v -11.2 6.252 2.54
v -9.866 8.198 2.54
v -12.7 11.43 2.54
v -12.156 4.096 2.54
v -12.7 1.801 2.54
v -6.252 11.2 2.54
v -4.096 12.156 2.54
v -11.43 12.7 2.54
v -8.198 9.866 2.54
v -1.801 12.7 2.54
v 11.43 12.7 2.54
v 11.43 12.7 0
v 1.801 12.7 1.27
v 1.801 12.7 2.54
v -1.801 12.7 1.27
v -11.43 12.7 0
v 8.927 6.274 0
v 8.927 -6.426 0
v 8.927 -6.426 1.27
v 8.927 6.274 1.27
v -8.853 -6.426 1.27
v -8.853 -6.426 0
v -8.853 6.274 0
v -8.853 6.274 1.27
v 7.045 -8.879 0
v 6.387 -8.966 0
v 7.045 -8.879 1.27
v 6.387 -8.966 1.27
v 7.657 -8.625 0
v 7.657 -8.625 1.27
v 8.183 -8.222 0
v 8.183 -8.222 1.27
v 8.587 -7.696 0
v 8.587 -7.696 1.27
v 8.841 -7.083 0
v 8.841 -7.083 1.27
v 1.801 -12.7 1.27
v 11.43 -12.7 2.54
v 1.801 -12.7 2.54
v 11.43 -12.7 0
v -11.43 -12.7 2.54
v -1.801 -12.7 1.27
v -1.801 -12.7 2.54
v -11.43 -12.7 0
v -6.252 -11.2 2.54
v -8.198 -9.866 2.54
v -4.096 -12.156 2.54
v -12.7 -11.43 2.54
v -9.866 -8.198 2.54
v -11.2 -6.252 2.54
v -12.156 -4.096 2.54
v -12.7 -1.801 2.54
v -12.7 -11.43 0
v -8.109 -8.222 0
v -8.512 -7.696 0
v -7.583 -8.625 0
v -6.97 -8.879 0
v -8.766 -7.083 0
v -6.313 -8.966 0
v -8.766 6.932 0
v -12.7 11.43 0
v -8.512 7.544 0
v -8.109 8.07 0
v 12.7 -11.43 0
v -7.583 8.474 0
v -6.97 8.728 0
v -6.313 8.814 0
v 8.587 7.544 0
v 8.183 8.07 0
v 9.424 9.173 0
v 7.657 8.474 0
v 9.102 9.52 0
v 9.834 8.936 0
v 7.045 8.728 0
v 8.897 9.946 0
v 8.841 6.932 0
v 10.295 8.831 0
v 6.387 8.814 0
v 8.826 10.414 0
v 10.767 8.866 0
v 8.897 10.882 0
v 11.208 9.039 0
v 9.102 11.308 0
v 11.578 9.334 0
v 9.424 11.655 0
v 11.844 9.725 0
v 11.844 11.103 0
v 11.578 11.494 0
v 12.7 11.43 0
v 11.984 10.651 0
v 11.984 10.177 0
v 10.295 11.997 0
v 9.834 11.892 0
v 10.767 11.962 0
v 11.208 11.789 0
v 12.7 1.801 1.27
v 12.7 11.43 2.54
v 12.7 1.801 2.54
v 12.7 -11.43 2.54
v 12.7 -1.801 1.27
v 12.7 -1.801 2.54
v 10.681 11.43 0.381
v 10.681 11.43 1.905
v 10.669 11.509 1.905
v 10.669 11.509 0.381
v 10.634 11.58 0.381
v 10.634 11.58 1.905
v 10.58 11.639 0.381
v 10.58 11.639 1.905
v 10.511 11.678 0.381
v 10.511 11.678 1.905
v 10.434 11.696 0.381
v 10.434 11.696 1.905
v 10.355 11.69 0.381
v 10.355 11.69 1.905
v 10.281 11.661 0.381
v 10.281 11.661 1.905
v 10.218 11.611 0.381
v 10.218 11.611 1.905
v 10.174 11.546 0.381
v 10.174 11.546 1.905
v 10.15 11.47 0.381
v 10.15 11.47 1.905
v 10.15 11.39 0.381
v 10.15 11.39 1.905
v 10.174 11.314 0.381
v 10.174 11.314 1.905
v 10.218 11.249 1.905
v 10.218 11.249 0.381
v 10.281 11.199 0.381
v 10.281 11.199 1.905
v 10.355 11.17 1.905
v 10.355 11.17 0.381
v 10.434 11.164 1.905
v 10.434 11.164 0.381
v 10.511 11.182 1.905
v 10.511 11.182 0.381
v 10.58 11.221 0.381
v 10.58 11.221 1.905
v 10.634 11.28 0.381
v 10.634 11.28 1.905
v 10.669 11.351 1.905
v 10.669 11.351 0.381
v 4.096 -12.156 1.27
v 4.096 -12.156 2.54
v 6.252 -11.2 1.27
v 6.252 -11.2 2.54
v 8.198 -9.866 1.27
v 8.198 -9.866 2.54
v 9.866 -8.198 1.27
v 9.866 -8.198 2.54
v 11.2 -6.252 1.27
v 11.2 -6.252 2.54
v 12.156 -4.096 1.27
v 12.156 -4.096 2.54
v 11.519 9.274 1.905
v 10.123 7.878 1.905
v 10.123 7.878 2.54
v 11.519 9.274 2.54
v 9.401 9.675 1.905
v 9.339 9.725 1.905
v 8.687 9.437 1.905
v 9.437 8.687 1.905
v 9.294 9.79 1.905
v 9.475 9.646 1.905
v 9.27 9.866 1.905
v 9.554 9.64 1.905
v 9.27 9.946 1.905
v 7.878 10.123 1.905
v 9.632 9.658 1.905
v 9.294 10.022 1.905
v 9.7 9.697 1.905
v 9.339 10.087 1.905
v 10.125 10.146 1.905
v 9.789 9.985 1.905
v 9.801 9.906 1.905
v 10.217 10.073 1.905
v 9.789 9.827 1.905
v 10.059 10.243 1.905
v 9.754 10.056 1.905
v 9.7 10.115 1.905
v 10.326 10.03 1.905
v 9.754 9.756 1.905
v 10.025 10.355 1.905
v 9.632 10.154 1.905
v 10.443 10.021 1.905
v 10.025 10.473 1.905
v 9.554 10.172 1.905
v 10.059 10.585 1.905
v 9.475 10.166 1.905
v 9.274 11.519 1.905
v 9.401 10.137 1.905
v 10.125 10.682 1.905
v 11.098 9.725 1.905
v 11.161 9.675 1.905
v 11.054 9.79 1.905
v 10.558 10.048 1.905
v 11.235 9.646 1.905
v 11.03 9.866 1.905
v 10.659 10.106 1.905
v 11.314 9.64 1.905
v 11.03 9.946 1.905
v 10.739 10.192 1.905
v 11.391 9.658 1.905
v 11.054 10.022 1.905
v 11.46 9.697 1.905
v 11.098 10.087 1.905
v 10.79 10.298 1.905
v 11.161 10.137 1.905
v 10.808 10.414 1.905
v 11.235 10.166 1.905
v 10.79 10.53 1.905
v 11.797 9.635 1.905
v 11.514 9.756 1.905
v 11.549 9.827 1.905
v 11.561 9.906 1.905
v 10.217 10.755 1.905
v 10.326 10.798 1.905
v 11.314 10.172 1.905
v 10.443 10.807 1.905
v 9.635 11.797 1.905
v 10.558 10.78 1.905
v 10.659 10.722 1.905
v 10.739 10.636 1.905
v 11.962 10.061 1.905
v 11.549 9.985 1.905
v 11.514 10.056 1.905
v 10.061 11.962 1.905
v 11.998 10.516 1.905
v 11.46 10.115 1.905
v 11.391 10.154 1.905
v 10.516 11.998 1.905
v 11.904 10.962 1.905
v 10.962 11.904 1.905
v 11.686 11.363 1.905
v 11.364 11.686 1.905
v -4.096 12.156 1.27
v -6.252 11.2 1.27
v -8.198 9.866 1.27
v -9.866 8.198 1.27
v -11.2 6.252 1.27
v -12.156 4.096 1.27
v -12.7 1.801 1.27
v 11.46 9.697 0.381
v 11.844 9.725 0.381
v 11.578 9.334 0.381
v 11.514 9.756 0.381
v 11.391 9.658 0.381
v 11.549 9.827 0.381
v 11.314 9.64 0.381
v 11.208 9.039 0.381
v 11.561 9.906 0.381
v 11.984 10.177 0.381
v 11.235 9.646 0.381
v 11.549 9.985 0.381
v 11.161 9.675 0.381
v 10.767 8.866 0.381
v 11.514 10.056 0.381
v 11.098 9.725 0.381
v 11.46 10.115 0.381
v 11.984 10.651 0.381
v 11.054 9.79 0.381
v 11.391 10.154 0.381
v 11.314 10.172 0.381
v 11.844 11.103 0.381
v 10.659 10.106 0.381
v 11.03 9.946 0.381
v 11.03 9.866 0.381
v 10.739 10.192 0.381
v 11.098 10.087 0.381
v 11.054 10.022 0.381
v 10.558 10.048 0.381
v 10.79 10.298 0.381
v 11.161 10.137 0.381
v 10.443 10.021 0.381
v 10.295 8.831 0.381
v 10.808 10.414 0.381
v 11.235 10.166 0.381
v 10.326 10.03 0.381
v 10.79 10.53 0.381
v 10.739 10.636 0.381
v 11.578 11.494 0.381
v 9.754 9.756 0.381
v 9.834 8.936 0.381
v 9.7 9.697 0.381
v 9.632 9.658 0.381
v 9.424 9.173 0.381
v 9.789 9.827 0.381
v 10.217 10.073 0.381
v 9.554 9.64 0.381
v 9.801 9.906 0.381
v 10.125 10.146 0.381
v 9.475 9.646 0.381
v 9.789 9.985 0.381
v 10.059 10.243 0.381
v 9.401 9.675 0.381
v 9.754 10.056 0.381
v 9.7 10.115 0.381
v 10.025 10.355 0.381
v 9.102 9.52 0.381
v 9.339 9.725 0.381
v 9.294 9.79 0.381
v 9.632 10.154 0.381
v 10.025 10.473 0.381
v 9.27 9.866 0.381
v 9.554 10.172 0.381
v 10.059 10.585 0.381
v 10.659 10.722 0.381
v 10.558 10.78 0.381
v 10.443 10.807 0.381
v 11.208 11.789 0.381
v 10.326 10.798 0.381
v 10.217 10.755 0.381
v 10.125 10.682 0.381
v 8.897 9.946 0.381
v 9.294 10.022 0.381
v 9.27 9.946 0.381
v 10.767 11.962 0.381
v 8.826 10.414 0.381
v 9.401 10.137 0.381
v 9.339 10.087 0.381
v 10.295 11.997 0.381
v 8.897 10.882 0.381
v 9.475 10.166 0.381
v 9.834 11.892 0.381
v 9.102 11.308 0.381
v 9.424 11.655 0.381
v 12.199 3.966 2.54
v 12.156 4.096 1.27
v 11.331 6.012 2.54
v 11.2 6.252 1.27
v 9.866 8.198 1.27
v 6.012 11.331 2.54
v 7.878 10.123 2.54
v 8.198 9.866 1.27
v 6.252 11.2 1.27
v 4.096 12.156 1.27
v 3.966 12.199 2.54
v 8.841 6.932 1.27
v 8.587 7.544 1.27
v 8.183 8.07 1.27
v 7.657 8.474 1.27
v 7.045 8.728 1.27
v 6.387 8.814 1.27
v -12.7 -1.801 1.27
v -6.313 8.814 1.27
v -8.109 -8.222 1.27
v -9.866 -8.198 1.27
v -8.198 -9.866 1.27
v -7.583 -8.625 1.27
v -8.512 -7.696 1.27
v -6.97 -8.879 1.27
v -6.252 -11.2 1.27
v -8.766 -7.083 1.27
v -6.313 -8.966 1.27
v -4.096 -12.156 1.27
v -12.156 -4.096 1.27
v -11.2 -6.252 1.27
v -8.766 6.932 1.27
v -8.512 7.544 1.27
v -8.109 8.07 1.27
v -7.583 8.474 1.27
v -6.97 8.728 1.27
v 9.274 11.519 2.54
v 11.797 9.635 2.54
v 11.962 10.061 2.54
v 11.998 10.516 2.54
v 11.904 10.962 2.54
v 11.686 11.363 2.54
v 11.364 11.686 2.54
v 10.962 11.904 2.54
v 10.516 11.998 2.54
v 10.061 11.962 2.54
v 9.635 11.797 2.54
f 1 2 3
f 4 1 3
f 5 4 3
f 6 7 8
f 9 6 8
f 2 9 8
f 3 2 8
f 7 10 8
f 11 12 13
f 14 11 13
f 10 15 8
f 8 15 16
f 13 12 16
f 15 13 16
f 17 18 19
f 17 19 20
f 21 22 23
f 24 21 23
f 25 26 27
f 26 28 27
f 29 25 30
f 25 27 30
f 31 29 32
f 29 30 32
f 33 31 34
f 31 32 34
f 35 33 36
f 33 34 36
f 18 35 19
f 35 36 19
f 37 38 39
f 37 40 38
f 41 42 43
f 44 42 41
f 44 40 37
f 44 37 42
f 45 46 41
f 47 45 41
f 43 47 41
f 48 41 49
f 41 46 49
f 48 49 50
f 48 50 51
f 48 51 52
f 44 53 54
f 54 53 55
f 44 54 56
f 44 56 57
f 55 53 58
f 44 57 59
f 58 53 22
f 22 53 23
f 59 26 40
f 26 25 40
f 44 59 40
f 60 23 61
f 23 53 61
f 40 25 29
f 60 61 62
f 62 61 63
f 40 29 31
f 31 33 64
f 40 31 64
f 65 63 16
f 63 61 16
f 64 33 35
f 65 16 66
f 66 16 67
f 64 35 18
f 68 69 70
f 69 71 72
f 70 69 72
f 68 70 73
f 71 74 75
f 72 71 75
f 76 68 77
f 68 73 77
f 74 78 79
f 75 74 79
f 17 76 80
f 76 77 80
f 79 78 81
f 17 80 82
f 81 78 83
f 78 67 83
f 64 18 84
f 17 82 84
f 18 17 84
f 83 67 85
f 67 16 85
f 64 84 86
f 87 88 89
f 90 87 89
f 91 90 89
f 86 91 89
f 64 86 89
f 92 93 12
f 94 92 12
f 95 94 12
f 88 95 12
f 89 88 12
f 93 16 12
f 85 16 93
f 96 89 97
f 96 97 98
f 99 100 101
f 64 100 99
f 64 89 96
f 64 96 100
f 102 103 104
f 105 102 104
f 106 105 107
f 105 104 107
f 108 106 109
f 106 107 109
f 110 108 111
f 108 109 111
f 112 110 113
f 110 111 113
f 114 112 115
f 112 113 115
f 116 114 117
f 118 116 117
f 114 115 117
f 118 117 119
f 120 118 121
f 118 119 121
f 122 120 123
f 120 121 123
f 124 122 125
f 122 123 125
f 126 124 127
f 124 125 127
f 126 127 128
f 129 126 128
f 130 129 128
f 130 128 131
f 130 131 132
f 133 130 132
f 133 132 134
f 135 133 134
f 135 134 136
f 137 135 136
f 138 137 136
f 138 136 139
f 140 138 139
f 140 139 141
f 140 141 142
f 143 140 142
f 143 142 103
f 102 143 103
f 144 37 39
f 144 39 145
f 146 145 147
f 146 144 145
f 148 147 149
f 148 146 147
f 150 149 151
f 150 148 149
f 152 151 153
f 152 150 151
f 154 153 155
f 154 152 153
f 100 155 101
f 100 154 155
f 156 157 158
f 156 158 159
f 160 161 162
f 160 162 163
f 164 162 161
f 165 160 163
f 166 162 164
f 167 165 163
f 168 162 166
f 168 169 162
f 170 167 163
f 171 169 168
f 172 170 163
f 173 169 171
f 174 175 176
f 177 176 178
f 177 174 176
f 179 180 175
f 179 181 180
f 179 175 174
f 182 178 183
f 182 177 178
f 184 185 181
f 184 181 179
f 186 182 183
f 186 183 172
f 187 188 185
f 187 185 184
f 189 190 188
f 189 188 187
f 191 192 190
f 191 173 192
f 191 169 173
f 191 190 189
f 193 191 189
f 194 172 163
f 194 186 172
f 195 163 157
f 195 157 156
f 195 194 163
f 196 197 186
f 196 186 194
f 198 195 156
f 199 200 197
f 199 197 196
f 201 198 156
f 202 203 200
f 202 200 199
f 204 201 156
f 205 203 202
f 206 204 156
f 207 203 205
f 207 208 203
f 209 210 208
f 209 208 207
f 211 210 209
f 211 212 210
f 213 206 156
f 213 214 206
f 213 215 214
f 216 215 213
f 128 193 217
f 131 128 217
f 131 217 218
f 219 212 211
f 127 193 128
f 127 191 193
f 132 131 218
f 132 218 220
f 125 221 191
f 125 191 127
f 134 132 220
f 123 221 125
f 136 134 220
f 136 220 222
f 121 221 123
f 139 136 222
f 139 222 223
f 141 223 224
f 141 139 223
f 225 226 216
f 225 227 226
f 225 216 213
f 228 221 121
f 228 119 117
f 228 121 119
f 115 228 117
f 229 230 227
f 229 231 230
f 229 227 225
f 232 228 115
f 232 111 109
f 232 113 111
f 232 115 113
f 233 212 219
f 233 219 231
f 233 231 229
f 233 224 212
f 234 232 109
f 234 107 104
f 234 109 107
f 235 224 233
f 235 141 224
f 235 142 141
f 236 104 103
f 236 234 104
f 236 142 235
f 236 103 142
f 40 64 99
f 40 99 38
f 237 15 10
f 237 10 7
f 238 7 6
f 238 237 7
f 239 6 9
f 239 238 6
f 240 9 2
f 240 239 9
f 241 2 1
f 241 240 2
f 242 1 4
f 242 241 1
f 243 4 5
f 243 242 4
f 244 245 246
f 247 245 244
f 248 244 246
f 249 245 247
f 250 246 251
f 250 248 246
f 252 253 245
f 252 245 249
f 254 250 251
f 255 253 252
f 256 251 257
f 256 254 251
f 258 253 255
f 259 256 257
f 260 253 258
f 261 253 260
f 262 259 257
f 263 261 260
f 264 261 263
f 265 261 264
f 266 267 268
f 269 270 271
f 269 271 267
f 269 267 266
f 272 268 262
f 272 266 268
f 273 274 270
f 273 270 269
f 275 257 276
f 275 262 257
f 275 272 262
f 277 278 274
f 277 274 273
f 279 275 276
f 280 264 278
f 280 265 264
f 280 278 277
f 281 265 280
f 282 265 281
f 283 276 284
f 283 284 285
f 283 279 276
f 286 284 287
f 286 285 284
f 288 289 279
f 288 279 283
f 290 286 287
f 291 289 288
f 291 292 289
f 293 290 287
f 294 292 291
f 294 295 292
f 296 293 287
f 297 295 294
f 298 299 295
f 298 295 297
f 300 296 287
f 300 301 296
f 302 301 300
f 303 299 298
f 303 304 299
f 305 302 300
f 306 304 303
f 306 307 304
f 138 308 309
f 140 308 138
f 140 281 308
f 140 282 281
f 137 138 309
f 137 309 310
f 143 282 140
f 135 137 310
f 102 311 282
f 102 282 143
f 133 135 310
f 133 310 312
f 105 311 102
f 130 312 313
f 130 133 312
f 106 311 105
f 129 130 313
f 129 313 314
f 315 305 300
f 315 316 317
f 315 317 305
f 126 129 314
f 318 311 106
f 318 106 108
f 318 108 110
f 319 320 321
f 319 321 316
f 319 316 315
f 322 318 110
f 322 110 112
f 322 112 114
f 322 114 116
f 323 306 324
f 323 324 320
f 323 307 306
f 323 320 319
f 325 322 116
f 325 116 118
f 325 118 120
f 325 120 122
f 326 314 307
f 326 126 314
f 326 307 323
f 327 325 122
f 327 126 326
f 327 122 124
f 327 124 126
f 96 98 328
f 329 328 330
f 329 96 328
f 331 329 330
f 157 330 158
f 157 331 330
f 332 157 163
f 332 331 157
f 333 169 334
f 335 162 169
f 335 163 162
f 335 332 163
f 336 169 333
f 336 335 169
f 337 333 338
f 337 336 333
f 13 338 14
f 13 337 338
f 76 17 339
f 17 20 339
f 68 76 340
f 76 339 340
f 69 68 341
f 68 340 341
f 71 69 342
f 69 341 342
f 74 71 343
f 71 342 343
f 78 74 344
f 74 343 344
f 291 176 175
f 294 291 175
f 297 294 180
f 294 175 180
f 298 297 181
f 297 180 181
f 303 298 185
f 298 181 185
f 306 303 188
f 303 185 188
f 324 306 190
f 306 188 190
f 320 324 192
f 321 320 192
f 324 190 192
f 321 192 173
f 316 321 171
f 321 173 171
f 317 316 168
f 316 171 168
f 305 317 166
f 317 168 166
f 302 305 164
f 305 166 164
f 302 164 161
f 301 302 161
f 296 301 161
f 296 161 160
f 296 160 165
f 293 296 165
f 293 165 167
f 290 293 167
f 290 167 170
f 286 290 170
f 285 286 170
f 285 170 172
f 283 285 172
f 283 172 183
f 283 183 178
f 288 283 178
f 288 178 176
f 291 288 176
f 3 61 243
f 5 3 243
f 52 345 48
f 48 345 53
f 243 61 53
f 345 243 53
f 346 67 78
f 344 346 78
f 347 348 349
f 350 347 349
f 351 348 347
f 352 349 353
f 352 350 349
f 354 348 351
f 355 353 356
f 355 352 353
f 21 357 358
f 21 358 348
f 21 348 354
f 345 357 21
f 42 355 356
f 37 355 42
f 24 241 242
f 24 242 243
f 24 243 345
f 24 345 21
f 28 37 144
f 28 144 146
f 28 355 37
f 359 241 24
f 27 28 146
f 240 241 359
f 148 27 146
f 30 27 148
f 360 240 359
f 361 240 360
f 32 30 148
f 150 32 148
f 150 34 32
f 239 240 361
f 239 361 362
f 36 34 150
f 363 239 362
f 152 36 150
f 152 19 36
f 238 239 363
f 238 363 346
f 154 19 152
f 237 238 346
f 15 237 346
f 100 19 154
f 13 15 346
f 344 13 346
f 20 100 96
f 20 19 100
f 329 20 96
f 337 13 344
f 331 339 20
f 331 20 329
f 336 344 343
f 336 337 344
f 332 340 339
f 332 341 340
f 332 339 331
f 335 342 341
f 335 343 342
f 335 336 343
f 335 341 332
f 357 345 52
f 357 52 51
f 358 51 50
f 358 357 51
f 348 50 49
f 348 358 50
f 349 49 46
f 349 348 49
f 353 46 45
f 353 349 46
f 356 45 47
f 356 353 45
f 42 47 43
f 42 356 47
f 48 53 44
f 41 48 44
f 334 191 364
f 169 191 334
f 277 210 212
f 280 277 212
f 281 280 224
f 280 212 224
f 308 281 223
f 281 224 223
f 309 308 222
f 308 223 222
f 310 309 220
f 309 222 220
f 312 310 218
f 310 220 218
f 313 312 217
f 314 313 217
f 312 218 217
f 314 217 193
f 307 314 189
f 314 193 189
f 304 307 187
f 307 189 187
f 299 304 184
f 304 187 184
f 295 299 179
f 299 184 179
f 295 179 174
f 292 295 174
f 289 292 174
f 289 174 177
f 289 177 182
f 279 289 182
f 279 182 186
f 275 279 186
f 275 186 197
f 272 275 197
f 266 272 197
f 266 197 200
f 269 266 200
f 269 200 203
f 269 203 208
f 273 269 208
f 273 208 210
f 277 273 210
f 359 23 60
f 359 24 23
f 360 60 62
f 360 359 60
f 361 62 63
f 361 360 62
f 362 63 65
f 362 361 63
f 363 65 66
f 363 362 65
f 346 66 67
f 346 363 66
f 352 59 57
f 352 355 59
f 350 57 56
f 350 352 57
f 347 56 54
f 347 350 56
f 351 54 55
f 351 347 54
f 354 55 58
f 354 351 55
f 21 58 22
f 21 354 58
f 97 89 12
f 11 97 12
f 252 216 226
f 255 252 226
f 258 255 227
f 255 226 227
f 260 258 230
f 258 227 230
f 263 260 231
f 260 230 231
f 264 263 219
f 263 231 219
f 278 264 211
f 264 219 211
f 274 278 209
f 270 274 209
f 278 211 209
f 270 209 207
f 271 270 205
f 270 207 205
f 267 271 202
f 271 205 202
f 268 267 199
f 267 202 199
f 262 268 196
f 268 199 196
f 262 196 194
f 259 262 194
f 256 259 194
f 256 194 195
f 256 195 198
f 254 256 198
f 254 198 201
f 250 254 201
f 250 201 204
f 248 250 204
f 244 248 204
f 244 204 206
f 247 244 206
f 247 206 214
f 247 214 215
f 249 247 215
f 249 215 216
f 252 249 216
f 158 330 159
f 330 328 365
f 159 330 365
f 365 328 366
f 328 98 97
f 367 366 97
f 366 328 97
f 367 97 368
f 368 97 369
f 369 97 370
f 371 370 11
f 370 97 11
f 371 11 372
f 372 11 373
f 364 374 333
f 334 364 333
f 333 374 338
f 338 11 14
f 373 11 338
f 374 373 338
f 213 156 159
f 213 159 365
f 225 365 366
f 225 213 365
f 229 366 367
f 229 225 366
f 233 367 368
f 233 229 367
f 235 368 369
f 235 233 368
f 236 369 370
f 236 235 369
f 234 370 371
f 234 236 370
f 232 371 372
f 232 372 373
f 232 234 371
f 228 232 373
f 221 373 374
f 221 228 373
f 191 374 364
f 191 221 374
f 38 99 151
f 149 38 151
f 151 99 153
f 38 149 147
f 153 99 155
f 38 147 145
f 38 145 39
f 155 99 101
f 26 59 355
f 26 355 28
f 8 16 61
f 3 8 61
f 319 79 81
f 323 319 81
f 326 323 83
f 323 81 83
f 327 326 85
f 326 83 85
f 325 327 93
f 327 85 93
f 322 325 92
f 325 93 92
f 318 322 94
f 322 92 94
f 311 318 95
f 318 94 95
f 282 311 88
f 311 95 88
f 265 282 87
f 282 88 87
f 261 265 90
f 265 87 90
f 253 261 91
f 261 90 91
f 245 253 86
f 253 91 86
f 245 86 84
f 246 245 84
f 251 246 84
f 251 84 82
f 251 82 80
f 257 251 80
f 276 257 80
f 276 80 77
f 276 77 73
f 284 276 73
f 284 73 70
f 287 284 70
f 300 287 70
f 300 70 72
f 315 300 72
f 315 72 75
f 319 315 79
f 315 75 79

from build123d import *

# Parameters (mm, degrees)
SKETCH1_W              = 17.78
SKETCH1_H              = 17.78
EXTRUSION1_DEPTH       = 1.27
EXTRUSION2_DEPTH       = 1.27
SKETCH3_R              = 1.5875
EXTRUSION3_DEPTH       = 0.381
HOLE1_D                = 0.5334
HOLE2_D                = 0.7874
EXTRUSION4_START       = -0.635
EXTRUSION4_OUTLINE_R   = 0.2667
EXTRUSION4_OUTLINE_R_2 = 0.3937
EXTRUSION4_DEPTH       = 0.635
FILLET1_R              = 2.54


# Read off the part's stored shape, not the designer's step: Extrusion4
with BuildPart() as part:
    # Sketch1 → Extrusion1 (new body)
    with BuildSketch(Plane.XY):
        Polygon((12.7, 11.43), (11.43, 12.7), (-11.43, 12.7), (-12.7, 11.43), (-12.7, -11.43), (-11.43, -12.7), (11.43, -12.7), (12.7, -11.43), align=None)
        with Locations((0.037350374, -0.075564582)):
            Rectangle(SKETCH1_W, SKETCH1_H, mode=Mode.SUBTRACT)
    extrude(amount=EXTRUSION1_DEPTH)

    # Sketch2 → Extrusion2 (add)
    with BuildSketch(Plane.XY.offset(1.27)):
        with BuildLine():
            ThreePointArc((1.800535754, -12.7), (9.070058682, -9.070058682), (12.7, -1.800535754))
            Line((12.7, -1.800535754), (12.7, -11.43))
            Line((12.7, -11.43), (11.43, -12.7))
            Line((11.43, -12.7), (1.800535754, -12.7))
        make_face()
        with BuildLine():
            ThreePointArc((-12.7, -1.800535754), (-9.070058682, -9.070058682), (-1.800535754, -12.7))
            Line((-1.800535754, -12.7), (-11.43, -12.7))
            Line((-11.43, -12.7), (-12.7, -11.43))
            Line((-12.7, -11.43), (-12.7, -1.800535754))
        make_face()
        with BuildLine():
            ThreePointArc((-1.800535754, 12.7), (-9.070058682, 9.070058682), (-12.7, 1.800535754))
            Line((-12.7, 1.800535754), (-12.7, 11.43))
            Line((-12.7, 11.43), (-11.43, 12.7))
            Line((-11.43, 12.7), (-1.800535754, 12.7))
        make_face()
        with BuildLine():
            ThreePointArc((12.7, 1.800535754), (9.070058682, 9.070058682), (1.800535754, 12.7))
            Line((1.800535754, 12.7), (11.43, 12.7))
            Line((11.43, 12.7), (12.7, 11.43))
            Line((12.7, 11.43), (12.7, 1.800535754))
        make_face()
    extrude(amount=EXTRUSION2_DEPTH)

    # Sketch3 → Extrusion3 (cut)
    with BuildSketch(Plane(origin=(0, 0, 0), x_dir=(-1, 0, 0), z_dir=(0, 0, -1))):
        with Locations((-10.414, 10.414)):
            Circle(SKETCH3_R)
    extrude(amount=-EXTRUSION3_DEPTH, mode=Mode.SUBTRACT)

    # Hole1 (through all)
    with Locations(Plane(origin=(0, 0, 0.381), x_dir=(-1, 0, 0), z_dir=(0, 0, -1))):
        with Locations((-10.414, 11.43), (-11.29388181, 9.906), (-9.53411819, 9.906)):
            Hole(HOLE1_D / 2)

    # Hole2 (through all)
    with Locations(Plane(origin=(0, 0, 0.381), x_dir=(-1, 0, 0), z_dir=(0, 0, -1))):
        with Locations((-10.414, 10.414)):
            Hole(HOLE2_D / 2)

    # Extrusion4 outline → Extrusion4 (cut)
    with BuildSketch(Plane.XY.offset(2.54).offset(EXTRUSION4_START)):
        with BuildLine():
            ThreePointArc((11.518713485, 9.273649455), (11.536532015, 11.536532015), (9.27379199, 11.518573195))
            Line((9.27379199, 11.518573195), (7.877795, 10.12285903))
            ThreePointArc((7.877795, 10.12285903), (9.070058682, 9.070058682), (10.12285903, 7.877795))
            Line((10.12285903, 7.877795), (11.518713485, 9.273649455))
        make_face()
        with Locations((9.53411819, 9.906)):
            Circle(EXTRUSION4_OUTLINE_R, mode=Mode.SUBTRACT)
        with Locations((11.29388181, 9.906)):
            Circle(EXTRUSION4_OUTLINE_R, mode=Mode.SUBTRACT)
        with Locations((10.414, 10.414)):
            Circle(EXTRUSION4_OUTLINE_R_2, mode=Mode.SUBTRACT)
        with Locations((10.414, 11.43)):
            Circle(EXTRUSION4_OUTLINE_R, mode=Mode.SUBTRACT)
    extrude(amount=EXTRUSION4_DEPTH, mode=Mode.SUBTRACT)

    # Fillet1
    fillet1_edges = [part.edges().sort_by_distance(p)[0] for p in [
        (8.927350374, -8.965564582, 0.635),
        (8.927350374, 8.814435418, 0.635),
        (-8.852649626, 8.814435418, 0.635),
        (-8.852649626, -8.965564582, 0.635),
    ]]
    fillet(fillet1_edges, radius=FILLET1_R)


solid = part.part
